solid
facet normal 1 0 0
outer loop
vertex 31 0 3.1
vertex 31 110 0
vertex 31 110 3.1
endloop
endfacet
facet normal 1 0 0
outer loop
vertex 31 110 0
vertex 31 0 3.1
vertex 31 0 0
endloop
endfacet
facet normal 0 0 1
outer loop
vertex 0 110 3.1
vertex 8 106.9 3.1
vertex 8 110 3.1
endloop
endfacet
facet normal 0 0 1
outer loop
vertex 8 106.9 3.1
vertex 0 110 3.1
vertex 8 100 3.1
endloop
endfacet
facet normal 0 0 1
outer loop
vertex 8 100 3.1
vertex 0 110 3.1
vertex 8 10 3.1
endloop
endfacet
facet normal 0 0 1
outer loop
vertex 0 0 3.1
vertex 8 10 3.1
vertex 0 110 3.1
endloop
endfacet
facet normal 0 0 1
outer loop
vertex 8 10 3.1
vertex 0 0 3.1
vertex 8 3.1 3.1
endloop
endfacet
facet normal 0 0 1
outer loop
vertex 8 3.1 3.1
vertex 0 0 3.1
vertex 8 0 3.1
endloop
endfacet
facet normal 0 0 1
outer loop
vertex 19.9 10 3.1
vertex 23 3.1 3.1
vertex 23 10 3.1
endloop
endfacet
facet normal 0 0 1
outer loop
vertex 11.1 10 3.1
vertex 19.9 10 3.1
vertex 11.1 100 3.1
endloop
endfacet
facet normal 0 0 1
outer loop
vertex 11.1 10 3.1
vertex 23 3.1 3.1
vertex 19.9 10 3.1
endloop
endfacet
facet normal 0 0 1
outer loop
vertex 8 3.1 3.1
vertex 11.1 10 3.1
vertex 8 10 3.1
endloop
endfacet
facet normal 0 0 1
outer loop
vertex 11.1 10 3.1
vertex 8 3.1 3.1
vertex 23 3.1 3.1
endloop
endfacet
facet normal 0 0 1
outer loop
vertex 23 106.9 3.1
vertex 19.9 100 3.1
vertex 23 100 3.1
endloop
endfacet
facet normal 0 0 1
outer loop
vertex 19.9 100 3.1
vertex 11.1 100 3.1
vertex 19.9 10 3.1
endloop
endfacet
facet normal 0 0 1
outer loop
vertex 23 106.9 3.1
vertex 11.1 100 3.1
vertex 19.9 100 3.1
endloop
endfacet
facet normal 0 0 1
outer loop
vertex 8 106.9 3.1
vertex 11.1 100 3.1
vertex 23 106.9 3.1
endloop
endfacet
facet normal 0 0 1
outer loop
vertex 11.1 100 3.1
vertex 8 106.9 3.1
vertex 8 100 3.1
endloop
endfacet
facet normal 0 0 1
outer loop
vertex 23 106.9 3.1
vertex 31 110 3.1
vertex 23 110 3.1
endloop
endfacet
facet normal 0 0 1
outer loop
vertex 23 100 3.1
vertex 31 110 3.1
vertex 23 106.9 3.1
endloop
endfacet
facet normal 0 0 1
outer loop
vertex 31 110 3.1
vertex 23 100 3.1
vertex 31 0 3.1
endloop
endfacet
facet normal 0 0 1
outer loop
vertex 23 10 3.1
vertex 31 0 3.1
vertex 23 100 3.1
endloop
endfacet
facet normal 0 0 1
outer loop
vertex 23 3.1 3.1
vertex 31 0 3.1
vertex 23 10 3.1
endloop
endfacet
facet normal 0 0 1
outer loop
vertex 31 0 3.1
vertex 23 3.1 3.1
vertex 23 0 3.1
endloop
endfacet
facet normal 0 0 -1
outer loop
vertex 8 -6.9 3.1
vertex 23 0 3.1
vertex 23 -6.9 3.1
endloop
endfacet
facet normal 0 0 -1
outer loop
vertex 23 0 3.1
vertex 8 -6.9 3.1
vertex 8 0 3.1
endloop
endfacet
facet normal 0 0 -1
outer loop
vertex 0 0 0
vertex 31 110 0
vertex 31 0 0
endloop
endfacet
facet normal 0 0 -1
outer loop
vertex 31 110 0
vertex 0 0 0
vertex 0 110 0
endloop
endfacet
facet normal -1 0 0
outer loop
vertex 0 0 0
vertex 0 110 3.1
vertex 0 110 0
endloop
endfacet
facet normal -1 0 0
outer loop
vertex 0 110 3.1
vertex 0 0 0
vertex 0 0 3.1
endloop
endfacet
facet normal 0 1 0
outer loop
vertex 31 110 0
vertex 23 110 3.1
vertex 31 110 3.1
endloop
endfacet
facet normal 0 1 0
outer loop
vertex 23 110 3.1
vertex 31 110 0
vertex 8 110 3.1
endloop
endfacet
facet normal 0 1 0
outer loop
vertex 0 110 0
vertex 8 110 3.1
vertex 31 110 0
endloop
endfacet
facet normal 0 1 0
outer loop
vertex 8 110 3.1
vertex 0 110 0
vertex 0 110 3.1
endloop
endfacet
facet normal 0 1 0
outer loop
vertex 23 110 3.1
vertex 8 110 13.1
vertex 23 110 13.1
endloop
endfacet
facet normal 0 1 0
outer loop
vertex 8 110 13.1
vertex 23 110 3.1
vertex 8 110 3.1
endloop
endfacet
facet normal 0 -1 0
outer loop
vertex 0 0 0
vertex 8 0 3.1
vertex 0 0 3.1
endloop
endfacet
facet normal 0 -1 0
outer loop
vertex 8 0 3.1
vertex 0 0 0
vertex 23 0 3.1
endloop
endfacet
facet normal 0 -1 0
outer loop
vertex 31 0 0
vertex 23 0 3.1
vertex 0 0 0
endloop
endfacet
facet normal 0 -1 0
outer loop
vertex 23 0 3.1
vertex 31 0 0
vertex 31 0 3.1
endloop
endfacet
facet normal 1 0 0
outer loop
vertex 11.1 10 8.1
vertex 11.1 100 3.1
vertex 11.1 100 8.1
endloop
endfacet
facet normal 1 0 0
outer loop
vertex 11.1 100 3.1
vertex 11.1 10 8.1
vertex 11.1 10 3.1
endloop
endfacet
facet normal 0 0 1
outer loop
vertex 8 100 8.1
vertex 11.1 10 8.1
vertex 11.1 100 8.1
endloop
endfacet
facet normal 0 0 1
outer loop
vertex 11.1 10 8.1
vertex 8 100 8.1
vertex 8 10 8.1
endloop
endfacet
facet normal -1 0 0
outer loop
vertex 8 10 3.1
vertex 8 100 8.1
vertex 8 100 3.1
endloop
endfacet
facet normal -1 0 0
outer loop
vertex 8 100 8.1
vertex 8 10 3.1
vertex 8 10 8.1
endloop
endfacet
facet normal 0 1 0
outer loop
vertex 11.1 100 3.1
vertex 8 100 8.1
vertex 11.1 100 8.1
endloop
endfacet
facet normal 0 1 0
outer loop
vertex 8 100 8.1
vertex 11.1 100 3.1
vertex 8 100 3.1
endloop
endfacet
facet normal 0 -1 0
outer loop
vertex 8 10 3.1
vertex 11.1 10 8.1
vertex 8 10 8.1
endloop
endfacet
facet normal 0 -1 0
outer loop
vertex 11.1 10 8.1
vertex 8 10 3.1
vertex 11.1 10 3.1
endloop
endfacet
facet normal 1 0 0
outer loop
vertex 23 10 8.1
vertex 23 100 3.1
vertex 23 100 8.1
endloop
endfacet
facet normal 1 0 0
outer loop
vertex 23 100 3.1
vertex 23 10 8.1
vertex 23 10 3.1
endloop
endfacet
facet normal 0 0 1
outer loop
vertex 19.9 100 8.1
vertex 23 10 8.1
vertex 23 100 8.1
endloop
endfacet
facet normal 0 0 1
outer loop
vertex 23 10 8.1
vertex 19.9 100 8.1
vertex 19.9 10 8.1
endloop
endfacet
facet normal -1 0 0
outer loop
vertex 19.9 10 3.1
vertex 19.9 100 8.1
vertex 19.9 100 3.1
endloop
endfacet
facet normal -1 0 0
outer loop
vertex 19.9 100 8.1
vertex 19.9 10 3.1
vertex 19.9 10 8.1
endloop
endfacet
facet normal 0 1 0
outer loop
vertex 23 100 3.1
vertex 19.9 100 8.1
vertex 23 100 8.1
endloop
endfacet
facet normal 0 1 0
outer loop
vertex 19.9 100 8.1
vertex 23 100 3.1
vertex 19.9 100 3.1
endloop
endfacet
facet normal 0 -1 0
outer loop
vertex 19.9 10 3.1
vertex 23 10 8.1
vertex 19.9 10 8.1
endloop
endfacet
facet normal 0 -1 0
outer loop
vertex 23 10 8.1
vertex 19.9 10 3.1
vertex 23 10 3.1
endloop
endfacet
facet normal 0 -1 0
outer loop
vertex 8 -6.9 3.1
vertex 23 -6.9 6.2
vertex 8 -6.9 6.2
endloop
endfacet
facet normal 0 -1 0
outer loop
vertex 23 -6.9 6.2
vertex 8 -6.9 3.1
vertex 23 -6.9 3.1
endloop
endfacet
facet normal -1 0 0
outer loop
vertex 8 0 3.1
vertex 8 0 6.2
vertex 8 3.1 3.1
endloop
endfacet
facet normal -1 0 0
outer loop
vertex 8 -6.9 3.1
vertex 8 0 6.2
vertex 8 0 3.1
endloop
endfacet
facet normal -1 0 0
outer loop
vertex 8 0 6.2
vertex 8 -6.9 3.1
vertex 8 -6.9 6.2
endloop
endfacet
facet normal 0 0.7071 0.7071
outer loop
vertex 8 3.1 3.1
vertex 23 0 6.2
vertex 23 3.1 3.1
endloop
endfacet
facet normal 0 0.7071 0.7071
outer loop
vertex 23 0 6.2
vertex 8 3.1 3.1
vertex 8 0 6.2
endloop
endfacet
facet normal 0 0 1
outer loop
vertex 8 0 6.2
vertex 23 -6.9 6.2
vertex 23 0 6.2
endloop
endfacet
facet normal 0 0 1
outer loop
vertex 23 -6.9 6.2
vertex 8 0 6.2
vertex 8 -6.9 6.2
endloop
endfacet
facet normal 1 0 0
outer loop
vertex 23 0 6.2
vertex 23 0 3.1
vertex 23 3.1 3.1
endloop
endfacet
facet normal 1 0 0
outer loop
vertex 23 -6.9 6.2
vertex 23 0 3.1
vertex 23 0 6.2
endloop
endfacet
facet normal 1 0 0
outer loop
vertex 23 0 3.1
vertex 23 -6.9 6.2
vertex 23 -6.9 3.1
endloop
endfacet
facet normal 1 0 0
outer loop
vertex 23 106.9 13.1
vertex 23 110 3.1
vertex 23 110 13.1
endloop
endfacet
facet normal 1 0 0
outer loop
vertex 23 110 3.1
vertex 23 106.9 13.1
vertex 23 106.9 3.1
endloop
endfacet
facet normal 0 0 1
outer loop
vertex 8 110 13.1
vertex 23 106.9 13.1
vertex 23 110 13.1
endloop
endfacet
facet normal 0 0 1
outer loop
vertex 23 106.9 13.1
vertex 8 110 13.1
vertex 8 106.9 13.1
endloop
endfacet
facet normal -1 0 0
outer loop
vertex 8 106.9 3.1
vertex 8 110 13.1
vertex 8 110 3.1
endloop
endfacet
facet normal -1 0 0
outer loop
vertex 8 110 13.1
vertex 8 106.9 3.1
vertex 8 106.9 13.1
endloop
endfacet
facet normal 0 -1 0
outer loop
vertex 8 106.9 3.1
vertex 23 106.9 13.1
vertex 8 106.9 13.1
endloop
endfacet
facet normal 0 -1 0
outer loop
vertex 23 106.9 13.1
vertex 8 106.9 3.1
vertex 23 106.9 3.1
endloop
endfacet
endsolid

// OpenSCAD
width = 31 ;
height = 110;
thickness = 3.1;
battery_width = 15;
battery_depth = 5;
mount_height = 10;


cube([width, height, thickness]);
translate([width/2-battery_width/2, 10, thickness])
    cube([thickness, height - 20, battery_depth]);
translate([width/2+battery_width/2-thickness, 10, thickness])
    cube([thickness, height - 20, battery_depth]);

translate([width/2-battery_width/2,-mount_height+thickness,thickness])
translate([battery_width,0,0])
rotate([0,-90,0])
linear_extrude(battery_width)
polygon([[0,0],[thickness,0],[thickness,mount_height-thickness],[0,mount_height]]);

translate([width/2-battery_width/2,height-thickness,thickness])
cube([battery_width, thickness, 10]);
